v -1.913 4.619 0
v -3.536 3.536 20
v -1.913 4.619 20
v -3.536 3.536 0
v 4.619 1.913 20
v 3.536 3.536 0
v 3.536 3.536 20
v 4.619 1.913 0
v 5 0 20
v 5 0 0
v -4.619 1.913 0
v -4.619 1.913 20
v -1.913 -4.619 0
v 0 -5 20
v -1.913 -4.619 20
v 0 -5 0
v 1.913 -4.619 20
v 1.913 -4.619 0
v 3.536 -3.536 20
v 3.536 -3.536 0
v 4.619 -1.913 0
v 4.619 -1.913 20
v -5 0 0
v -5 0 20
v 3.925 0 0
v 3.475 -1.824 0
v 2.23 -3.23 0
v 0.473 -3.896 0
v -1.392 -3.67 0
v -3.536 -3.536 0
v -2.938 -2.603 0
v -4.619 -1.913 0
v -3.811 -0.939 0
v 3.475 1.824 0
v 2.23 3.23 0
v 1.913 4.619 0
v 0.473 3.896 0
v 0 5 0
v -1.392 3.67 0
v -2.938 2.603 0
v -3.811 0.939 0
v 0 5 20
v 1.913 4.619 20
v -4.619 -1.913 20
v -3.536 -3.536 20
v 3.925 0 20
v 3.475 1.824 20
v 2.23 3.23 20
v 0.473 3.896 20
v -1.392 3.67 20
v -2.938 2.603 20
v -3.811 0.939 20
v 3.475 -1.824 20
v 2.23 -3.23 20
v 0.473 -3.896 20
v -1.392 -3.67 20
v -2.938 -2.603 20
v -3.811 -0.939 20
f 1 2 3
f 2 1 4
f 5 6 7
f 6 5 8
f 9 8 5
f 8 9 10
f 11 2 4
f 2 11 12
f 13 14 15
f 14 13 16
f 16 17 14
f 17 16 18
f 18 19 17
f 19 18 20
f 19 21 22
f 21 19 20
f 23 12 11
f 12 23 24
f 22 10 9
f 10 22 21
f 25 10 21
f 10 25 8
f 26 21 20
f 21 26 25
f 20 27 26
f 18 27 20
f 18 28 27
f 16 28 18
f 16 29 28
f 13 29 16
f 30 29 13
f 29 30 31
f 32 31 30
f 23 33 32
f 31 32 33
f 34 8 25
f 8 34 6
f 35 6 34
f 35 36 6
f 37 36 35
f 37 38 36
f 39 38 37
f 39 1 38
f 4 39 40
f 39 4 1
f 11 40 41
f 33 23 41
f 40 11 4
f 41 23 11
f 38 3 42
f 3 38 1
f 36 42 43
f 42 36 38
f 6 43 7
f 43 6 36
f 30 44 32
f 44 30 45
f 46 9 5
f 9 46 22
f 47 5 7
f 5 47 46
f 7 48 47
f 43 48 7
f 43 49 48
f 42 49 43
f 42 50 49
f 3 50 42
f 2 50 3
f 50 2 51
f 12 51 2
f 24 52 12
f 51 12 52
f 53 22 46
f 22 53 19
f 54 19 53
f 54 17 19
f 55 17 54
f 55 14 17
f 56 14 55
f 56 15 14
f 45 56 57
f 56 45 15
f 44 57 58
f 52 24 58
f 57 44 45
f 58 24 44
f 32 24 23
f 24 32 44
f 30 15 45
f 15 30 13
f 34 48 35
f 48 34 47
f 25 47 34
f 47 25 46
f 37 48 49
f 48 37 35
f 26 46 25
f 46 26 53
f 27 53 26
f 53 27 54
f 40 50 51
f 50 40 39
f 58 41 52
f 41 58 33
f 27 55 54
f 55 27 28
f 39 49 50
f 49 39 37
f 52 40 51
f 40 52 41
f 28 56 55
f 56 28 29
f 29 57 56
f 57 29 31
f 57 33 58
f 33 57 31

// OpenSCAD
union() {
	difference() {
		cylinder(h = 20, r = 5);
		cylinder(h = 20, r = 3.9250000000);
	}
}
